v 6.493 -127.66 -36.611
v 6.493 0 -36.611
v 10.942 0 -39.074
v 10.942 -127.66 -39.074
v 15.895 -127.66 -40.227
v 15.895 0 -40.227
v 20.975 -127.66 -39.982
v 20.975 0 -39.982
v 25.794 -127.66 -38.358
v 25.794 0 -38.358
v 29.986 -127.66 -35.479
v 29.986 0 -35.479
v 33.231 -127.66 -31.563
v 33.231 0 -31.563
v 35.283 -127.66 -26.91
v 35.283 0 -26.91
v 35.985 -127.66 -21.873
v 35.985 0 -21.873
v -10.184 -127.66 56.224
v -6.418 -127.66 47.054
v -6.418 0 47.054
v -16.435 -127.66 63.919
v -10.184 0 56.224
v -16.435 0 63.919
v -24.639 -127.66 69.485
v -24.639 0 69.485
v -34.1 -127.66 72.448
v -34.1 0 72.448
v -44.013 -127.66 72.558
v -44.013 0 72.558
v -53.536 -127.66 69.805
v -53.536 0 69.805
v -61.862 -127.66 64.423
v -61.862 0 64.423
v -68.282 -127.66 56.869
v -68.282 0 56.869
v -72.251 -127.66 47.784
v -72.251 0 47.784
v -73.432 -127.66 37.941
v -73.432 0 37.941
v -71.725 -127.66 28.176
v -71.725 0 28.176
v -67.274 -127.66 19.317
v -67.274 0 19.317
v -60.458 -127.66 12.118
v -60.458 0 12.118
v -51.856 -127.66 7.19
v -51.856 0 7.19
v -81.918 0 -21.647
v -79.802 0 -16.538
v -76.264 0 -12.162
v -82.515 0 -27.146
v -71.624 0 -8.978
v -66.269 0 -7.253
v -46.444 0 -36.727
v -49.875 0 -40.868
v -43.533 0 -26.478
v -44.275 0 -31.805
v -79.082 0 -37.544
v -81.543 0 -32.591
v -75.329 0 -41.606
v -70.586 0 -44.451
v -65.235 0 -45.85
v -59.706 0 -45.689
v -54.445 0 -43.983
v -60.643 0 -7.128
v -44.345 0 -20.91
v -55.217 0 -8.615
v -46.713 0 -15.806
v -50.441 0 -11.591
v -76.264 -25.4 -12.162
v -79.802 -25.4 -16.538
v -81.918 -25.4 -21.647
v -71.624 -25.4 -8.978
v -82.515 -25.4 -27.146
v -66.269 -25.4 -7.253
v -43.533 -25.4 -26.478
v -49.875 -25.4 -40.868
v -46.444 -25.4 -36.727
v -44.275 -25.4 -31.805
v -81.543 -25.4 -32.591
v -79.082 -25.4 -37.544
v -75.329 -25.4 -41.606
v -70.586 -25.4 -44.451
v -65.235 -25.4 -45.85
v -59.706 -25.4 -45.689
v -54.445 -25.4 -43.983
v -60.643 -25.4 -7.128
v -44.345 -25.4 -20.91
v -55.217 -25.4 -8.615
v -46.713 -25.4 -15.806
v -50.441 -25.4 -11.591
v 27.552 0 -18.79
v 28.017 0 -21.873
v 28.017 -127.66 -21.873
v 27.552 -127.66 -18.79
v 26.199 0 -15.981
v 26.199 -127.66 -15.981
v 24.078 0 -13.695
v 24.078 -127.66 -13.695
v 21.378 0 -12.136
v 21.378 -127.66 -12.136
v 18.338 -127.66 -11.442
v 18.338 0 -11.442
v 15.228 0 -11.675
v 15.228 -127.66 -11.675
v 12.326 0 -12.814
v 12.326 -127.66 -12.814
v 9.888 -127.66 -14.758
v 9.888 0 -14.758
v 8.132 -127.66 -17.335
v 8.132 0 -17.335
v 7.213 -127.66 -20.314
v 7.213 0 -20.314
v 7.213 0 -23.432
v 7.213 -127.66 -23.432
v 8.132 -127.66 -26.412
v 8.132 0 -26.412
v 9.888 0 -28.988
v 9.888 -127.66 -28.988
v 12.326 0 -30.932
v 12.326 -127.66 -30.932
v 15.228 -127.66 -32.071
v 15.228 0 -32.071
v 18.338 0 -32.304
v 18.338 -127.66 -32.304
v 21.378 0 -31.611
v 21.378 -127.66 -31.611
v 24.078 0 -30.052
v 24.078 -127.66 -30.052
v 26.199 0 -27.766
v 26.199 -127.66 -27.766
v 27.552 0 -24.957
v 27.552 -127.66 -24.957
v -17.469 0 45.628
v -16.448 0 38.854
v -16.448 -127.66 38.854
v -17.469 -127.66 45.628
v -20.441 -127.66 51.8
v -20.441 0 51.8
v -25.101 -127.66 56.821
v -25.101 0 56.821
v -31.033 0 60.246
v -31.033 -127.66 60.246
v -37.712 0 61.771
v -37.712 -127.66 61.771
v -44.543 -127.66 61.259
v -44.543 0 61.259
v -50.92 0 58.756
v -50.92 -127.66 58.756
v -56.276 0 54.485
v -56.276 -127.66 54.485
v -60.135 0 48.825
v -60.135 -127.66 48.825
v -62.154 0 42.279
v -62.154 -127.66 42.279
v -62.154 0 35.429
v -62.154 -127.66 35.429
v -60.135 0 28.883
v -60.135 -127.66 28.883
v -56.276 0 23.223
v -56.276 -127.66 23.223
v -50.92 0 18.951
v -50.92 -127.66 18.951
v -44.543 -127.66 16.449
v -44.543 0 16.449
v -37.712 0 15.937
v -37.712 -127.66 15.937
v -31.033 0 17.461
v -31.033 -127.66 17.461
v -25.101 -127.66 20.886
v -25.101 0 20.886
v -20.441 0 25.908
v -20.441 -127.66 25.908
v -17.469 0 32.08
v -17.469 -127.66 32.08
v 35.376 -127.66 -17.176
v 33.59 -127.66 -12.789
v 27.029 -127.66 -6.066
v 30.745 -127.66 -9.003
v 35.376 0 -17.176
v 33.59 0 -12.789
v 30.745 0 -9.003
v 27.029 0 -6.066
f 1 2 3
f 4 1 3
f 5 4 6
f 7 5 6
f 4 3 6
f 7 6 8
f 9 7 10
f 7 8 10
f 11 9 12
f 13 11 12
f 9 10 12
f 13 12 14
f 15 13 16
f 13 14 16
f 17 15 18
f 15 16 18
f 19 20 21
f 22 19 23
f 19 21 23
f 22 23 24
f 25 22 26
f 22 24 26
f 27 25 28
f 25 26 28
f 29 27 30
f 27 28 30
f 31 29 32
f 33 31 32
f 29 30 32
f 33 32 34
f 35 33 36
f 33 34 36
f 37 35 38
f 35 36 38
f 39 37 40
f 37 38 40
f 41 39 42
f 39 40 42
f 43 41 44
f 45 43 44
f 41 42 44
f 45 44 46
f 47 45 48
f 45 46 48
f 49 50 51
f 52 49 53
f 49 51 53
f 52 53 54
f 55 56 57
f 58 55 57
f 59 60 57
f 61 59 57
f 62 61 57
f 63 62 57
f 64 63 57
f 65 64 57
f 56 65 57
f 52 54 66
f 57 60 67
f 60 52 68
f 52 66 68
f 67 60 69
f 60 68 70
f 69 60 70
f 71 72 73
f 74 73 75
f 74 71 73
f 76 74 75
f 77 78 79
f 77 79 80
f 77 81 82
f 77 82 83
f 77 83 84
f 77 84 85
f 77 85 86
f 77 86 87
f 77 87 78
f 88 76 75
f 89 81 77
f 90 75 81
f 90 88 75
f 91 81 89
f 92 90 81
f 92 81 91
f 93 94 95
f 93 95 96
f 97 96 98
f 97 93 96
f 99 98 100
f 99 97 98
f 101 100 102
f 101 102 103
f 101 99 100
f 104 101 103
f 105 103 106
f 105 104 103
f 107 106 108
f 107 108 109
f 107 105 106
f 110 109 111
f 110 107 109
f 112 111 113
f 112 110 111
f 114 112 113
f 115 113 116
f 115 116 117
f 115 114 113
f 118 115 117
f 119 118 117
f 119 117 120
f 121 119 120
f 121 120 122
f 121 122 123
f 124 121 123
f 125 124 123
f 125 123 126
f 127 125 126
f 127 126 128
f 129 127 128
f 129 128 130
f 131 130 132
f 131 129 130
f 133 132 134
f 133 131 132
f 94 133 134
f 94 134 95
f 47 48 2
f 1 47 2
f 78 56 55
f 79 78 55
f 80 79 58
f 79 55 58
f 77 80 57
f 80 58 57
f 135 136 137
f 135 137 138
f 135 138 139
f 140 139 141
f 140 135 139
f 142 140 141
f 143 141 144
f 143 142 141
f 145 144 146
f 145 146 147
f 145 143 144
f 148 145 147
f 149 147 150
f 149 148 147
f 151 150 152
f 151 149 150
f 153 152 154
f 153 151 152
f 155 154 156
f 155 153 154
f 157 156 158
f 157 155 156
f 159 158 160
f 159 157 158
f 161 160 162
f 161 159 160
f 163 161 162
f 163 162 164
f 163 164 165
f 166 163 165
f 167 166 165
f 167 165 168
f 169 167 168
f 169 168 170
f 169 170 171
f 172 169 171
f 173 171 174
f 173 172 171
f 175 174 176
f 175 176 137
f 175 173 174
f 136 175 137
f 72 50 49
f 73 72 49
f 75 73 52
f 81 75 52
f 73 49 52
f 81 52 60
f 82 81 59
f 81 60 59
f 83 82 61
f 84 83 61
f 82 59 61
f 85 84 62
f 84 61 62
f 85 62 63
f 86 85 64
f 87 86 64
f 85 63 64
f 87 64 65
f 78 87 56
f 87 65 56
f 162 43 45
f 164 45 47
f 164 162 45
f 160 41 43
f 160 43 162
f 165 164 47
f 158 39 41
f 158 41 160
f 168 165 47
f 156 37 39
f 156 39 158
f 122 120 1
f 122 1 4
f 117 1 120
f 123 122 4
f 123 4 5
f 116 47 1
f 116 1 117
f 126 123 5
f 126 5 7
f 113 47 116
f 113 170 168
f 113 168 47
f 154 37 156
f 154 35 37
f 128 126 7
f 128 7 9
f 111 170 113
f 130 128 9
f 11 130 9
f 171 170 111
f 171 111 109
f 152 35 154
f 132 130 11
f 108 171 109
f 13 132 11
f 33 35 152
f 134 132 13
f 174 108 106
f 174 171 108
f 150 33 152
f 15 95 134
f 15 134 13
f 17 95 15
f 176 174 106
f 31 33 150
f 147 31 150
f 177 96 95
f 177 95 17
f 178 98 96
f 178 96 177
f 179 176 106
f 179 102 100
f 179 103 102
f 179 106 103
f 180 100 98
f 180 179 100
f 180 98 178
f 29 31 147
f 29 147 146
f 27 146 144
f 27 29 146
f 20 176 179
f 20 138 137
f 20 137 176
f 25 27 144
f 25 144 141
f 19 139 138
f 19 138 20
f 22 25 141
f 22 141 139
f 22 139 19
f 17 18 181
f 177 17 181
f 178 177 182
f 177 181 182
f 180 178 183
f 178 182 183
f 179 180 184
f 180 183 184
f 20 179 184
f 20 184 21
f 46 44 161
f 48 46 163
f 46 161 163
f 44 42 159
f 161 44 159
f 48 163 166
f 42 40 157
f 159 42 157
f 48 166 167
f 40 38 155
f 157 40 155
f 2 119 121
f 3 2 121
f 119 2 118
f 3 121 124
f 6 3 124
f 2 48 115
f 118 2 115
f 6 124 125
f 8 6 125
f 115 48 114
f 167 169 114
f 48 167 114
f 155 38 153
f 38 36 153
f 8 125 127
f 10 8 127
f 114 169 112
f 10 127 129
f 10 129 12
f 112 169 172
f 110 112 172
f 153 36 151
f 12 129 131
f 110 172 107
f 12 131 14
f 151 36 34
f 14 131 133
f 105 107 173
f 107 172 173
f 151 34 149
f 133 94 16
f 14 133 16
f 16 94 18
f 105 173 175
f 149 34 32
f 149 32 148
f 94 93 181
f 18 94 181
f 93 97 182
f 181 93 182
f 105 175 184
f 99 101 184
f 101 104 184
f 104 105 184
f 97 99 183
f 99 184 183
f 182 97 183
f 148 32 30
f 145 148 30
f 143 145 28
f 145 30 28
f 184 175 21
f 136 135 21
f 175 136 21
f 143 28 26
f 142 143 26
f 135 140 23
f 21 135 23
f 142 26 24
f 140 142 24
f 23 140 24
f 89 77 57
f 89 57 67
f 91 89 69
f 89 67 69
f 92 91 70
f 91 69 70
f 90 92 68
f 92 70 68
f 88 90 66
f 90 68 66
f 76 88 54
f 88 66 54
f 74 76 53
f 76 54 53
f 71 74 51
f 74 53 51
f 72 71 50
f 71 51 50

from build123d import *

# Parameters (mm, degrees)
F0_R     = 22.981247
F0_R_2   = 10.460463
F1_DEPTH = 127.6604
F3_DEPTH = 25.4


with BuildPart() as f1:
    # F0 (on Front) → F1 (new body)
    with BuildSketch(Plane.XZ):
        with BuildLine():
            ThreePointArc((-51.855936, 7.190227), (-20.268045, 10.749642), (-5.414695, 38.853776))
            ThreePointArc((-5.414695, 38.853776), (-5.666436, 42.984448), (-6.417935, 47.053977))
            ThreePointArc((-6.417935, 47.053977), (-61.861826, 64.422999), (-51.855936, 7.190227))
        make_face()
        with Locations((-39.429389, 38.853776)):
            Circle(F0_R, mode=Mode.SUBTRACT)
        with BuildLine():
            ThreePointArc((-6.417935, 47.053977), (-5.666436, 42.984448), (-5.414695, 38.853776))
            ThreePointArc((-5.414695, 38.853776), (-20.268045, 10.749642), (-51.855936, 7.190227))
            Line((-51.855936, 7.190227), (6.492535, -36.611223))
            ThreePointArc((6.492535, -36.611223), (2.262835, -11.590906), (27.029378, -6.065964))
            Line((27.029378, -6.065964), (-6.417935, 47.053977))
        make_face()
        with BuildLine():
            ThreePointArc((35.984713, -21.873237), (33.590331, -12.789351), (27.029378, -6.065964))
            ThreePointArc((27.029378, -6.065964), (2.262835, -11.590906), (6.492535, -36.611223))
            ThreePointArc((6.492535, -36.611223), (25.794032, -38.358054), (35.984713, -21.873237))
        make_face()
        with Locations((17.556152, -21.873237)):
            Circle(F0_R_2, mode=Mode.SUBTRACT)
    extrude(amount=F1_DEPTH)


with BuildPart() as f3:
    # F2 (on Front) → F3 (new body)
    with BuildSketch(Plane.XZ):
        with BuildLine():
            ThreePointArc((-49.875129, -40.868416), (-45.188758, -34.341089), (-43.532876, -26.478129))
            ThreePointArc((-43.532876, -26.478129), (-57.875969, -7.674981), (-79.801623, -16.537736))
            ThreePointArc((-79.801623, -16.537736), (-75.328553, -41.605889), (-49.875129, -40.868416))
        make_face()
    extrude(amount=F3_DEPTH)


solid = Compound([f1.part, f3.part])
